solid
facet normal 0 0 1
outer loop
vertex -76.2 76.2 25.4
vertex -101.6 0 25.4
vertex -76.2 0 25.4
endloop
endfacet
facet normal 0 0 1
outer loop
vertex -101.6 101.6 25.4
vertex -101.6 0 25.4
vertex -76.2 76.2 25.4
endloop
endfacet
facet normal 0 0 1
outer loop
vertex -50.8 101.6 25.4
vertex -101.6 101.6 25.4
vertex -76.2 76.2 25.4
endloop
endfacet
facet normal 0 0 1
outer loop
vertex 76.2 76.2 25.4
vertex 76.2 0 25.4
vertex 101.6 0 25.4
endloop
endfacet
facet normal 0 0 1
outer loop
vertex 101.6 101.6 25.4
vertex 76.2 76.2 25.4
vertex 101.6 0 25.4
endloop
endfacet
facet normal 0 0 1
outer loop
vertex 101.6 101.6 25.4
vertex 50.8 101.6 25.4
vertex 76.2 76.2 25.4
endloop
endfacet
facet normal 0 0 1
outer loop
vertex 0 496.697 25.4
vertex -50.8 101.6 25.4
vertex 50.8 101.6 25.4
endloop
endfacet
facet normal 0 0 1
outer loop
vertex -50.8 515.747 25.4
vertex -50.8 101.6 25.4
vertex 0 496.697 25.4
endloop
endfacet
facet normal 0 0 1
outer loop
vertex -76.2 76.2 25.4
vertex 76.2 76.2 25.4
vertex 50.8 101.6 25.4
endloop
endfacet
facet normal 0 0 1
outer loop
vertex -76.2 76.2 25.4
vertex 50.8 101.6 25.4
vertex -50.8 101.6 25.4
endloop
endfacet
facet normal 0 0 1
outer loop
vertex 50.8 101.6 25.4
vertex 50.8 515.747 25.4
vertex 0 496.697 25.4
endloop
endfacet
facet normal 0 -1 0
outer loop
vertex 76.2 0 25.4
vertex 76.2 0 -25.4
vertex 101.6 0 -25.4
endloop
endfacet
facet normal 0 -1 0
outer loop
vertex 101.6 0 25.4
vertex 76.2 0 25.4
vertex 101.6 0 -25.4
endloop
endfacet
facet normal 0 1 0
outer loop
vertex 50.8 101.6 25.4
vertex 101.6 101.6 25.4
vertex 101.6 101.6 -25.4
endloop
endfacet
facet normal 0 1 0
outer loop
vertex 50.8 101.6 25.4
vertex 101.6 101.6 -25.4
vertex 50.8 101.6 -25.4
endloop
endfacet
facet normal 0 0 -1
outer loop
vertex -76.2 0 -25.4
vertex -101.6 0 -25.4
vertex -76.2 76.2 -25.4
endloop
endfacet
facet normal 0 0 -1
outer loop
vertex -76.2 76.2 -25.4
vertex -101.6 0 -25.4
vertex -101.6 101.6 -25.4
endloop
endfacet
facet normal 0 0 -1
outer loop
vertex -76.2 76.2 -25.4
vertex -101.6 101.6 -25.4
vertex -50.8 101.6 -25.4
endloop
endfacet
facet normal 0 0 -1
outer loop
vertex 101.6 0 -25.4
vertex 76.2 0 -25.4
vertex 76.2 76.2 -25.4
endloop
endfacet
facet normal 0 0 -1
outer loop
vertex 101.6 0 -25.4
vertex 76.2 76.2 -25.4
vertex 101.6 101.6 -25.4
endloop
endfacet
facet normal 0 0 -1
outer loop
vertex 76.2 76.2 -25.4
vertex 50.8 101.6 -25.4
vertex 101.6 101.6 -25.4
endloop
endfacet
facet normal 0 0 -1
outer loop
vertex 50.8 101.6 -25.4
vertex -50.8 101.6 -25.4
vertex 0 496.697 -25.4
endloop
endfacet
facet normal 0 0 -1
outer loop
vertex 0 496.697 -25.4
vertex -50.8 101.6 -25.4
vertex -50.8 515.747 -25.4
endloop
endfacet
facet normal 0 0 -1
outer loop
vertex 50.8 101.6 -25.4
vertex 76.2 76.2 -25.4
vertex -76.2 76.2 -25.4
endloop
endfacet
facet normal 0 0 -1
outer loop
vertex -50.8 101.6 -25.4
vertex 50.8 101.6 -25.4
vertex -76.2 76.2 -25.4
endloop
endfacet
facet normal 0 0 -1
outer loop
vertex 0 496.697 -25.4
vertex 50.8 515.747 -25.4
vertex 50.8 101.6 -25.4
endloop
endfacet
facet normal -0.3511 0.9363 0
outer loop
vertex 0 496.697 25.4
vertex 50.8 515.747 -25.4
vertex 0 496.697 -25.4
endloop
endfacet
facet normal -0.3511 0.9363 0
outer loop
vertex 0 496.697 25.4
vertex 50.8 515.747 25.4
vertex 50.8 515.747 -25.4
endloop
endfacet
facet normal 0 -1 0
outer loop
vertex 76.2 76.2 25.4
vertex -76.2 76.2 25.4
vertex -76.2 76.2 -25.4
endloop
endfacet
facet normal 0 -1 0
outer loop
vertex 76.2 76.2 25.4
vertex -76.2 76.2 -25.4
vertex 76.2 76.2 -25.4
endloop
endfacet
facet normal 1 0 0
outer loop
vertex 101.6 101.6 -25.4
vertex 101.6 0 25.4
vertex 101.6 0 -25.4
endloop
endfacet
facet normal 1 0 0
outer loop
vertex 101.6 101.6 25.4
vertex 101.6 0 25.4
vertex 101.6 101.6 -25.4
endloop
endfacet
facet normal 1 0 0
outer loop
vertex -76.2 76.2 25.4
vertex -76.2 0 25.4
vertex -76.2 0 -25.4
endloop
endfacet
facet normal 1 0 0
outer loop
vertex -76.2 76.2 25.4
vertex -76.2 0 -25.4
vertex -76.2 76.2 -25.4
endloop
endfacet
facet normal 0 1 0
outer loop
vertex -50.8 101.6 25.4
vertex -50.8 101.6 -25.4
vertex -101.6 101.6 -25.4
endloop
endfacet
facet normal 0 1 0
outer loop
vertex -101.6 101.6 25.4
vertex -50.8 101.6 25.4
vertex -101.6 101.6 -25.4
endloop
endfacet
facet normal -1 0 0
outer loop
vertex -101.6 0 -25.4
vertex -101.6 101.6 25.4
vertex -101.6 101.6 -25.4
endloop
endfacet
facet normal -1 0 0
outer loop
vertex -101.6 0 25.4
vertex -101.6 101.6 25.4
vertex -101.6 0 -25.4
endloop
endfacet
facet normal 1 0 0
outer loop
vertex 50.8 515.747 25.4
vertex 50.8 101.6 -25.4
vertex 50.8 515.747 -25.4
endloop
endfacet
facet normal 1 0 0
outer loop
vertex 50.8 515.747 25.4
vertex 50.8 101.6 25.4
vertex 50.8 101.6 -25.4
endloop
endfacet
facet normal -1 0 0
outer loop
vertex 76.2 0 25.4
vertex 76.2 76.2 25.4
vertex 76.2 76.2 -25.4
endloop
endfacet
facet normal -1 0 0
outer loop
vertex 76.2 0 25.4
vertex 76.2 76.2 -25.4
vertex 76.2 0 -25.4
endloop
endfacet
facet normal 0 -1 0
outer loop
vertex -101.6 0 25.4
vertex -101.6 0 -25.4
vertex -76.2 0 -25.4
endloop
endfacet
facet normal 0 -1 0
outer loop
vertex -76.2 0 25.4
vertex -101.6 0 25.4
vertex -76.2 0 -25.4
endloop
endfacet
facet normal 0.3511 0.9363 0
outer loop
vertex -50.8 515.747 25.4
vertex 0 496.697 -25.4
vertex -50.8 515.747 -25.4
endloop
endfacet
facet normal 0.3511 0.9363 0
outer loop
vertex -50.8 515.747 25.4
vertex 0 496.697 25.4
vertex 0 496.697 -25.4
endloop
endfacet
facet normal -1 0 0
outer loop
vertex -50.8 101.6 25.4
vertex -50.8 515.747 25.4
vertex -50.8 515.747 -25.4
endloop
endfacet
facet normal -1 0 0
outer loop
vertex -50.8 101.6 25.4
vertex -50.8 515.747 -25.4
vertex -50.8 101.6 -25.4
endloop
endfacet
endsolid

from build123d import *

# Parameters (mm, degrees)
BOSS_EXTRUDE1_DEPTH = 25.4


with BuildPart() as part:
    # Sketch1 → Boss-Extrude1 (new body, symmetric)
    with BuildSketch(Plane.XY):
        Polygon((0, 496.697), (-50.8, 515.747), (-50.8, 101.6), (-101.6, 101.6), (-101.6, 0), (-76.2, 0), (-76.2, 76.2), (0, 76.2), (76.2, 76.2), (76.2, 0), (101.6, 0), (101.6, 101.6), (50.8, 101.6), (50.8, 515.747), align=None)
    extrude(amount=BOSS_EXTRUDE1_DEPTH, both=True)


solid = part.part
